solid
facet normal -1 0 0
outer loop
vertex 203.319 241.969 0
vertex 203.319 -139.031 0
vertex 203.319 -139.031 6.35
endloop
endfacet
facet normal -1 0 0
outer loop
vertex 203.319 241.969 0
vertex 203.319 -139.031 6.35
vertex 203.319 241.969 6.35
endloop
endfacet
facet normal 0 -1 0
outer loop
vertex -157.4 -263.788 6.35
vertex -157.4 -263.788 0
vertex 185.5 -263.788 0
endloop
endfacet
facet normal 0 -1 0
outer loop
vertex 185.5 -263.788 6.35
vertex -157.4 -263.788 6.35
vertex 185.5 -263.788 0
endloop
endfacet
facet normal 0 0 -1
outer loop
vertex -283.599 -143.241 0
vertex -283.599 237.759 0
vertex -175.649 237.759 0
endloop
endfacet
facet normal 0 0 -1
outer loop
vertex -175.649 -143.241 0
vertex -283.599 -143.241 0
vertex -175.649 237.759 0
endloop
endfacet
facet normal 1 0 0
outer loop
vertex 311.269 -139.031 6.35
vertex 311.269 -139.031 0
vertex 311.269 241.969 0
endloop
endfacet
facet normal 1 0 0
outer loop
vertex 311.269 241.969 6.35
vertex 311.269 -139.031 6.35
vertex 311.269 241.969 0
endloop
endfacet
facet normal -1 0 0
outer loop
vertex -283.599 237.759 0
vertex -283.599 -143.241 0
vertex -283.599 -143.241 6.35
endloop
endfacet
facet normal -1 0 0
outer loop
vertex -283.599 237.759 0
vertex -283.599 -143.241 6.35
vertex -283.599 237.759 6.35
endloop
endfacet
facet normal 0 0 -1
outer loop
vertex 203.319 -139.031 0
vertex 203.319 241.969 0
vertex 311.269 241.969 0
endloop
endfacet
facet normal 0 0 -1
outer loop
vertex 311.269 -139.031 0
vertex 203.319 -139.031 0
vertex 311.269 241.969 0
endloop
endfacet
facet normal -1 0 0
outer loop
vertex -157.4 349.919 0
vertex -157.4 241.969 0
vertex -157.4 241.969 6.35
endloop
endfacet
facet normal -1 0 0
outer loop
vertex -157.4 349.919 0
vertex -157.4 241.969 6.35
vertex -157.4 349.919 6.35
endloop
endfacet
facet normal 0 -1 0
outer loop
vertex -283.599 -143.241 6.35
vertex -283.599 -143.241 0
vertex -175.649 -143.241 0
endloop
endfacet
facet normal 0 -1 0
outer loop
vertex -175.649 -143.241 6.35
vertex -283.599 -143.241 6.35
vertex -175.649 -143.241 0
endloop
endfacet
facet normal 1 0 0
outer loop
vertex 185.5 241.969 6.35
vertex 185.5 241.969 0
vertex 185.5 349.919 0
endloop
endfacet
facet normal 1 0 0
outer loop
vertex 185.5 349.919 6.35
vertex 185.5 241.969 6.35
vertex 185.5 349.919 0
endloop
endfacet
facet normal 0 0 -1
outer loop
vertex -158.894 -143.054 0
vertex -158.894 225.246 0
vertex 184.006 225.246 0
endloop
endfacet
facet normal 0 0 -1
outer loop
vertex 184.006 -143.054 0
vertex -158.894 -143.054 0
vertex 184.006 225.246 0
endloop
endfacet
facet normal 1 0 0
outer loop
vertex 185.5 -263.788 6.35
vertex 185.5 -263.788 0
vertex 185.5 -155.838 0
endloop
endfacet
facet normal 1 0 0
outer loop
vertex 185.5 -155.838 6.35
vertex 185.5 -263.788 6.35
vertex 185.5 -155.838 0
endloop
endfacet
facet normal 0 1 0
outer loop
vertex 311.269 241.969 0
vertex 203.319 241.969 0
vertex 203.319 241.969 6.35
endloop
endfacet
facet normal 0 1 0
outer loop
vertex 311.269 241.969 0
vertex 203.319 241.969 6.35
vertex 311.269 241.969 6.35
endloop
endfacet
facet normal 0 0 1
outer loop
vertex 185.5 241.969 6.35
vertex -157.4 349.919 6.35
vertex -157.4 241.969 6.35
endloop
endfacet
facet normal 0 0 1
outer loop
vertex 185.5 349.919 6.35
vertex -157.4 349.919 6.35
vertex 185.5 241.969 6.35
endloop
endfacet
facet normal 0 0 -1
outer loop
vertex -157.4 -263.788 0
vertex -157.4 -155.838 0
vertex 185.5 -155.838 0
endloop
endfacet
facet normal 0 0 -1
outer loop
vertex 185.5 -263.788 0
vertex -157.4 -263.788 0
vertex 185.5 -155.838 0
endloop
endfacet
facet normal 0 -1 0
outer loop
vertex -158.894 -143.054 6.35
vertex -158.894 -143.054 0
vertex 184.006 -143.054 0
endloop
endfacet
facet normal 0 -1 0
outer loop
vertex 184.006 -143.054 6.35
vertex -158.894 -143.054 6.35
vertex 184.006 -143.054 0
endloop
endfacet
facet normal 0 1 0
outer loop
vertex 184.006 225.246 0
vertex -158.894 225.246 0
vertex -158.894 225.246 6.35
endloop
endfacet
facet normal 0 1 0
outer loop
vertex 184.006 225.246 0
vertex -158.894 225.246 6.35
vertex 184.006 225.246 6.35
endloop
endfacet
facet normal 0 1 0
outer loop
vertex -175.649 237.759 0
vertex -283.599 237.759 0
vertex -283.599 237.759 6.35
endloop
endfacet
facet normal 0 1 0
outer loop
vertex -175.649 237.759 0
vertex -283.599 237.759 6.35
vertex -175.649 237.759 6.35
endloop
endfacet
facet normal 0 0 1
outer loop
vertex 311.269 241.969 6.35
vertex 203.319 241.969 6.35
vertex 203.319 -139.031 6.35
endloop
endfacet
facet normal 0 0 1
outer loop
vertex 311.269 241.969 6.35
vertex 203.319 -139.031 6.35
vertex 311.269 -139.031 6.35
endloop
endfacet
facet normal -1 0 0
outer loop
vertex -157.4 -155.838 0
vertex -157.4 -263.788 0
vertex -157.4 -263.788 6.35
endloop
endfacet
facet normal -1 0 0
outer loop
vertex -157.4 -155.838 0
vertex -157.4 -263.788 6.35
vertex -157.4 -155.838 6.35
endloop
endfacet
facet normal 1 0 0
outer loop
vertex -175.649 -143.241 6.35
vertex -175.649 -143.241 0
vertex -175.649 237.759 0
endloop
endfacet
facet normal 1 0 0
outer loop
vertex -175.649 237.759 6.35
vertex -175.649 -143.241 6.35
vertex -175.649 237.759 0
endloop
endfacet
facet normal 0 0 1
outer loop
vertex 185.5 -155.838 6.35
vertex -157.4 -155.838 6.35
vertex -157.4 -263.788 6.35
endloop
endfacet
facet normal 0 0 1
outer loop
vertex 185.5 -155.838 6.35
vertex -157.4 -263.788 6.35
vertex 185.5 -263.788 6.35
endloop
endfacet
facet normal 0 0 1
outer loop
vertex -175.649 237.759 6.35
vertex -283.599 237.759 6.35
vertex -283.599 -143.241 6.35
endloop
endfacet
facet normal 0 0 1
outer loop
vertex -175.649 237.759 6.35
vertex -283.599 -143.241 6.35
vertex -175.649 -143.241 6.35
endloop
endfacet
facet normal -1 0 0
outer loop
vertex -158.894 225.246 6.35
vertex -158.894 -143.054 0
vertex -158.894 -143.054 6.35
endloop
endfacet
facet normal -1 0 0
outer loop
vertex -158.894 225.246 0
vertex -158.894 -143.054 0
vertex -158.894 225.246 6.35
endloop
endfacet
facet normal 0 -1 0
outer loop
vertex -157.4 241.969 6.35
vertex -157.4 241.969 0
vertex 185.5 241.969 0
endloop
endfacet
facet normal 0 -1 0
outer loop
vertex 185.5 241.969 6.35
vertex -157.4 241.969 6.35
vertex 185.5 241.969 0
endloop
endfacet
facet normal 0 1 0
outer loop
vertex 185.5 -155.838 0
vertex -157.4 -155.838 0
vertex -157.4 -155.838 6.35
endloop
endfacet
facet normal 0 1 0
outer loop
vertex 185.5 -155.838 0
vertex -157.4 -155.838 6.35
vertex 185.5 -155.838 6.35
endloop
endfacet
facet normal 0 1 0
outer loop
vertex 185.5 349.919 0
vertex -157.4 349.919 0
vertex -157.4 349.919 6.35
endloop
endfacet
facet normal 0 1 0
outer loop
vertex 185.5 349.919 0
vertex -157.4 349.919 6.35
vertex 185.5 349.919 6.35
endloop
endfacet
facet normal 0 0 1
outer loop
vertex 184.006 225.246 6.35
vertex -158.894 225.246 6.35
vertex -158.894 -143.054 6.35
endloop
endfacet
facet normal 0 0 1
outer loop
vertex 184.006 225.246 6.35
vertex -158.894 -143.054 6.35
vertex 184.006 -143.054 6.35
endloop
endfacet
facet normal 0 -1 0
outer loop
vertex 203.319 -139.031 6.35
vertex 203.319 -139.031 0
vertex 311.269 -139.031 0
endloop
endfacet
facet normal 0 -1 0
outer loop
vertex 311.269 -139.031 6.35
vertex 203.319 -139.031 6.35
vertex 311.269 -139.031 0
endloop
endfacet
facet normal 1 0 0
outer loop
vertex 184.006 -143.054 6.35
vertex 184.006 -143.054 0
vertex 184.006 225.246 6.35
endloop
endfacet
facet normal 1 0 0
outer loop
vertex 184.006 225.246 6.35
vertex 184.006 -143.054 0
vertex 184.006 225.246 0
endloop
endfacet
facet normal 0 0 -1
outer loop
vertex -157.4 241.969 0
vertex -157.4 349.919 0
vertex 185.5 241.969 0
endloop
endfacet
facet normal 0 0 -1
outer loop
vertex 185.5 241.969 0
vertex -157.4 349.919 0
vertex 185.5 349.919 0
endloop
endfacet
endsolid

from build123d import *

# Parameters (mm, degrees)
F0_W     = 342.9
F0_H     = 368.3
F1_DEPTH = 6.35
F0_W_2   = 107.95
F0_H_2   = 381
F0_H_3   = 107.95
F2_DEPTH = 6.35


with BuildPart() as f1:
    # F0 (on Top) → F1 (new body)
    with BuildSketch(Plane.XY):
        with Locations((12.555983, 41.096156)):
            Rectangle(F0_W, F0_H)
    extrude(amount=F1_DEPTH)


with BuildPart() as f2:
    # F0 (on Top) → F2 (new body)
    with BuildSketch(Plane.XY):
        with Locations((257.29443, 51.468691)):
            Rectangle(F0_W_2, F0_H_2)
        with Locations((14.049705, -209.812836)):
            Rectangle(F0_W, F0_H_3)
        with Locations((-229.62387, 47.258669)):
            Rectangle(F0_W_2, F0_H_2)
        with Locations((14.049705, 295.943691)):
            Rectangle(F0_W, F0_H_3)
    extrude(amount=F2_DEPTH)


solid = Compound([f1.part, f2.part])
